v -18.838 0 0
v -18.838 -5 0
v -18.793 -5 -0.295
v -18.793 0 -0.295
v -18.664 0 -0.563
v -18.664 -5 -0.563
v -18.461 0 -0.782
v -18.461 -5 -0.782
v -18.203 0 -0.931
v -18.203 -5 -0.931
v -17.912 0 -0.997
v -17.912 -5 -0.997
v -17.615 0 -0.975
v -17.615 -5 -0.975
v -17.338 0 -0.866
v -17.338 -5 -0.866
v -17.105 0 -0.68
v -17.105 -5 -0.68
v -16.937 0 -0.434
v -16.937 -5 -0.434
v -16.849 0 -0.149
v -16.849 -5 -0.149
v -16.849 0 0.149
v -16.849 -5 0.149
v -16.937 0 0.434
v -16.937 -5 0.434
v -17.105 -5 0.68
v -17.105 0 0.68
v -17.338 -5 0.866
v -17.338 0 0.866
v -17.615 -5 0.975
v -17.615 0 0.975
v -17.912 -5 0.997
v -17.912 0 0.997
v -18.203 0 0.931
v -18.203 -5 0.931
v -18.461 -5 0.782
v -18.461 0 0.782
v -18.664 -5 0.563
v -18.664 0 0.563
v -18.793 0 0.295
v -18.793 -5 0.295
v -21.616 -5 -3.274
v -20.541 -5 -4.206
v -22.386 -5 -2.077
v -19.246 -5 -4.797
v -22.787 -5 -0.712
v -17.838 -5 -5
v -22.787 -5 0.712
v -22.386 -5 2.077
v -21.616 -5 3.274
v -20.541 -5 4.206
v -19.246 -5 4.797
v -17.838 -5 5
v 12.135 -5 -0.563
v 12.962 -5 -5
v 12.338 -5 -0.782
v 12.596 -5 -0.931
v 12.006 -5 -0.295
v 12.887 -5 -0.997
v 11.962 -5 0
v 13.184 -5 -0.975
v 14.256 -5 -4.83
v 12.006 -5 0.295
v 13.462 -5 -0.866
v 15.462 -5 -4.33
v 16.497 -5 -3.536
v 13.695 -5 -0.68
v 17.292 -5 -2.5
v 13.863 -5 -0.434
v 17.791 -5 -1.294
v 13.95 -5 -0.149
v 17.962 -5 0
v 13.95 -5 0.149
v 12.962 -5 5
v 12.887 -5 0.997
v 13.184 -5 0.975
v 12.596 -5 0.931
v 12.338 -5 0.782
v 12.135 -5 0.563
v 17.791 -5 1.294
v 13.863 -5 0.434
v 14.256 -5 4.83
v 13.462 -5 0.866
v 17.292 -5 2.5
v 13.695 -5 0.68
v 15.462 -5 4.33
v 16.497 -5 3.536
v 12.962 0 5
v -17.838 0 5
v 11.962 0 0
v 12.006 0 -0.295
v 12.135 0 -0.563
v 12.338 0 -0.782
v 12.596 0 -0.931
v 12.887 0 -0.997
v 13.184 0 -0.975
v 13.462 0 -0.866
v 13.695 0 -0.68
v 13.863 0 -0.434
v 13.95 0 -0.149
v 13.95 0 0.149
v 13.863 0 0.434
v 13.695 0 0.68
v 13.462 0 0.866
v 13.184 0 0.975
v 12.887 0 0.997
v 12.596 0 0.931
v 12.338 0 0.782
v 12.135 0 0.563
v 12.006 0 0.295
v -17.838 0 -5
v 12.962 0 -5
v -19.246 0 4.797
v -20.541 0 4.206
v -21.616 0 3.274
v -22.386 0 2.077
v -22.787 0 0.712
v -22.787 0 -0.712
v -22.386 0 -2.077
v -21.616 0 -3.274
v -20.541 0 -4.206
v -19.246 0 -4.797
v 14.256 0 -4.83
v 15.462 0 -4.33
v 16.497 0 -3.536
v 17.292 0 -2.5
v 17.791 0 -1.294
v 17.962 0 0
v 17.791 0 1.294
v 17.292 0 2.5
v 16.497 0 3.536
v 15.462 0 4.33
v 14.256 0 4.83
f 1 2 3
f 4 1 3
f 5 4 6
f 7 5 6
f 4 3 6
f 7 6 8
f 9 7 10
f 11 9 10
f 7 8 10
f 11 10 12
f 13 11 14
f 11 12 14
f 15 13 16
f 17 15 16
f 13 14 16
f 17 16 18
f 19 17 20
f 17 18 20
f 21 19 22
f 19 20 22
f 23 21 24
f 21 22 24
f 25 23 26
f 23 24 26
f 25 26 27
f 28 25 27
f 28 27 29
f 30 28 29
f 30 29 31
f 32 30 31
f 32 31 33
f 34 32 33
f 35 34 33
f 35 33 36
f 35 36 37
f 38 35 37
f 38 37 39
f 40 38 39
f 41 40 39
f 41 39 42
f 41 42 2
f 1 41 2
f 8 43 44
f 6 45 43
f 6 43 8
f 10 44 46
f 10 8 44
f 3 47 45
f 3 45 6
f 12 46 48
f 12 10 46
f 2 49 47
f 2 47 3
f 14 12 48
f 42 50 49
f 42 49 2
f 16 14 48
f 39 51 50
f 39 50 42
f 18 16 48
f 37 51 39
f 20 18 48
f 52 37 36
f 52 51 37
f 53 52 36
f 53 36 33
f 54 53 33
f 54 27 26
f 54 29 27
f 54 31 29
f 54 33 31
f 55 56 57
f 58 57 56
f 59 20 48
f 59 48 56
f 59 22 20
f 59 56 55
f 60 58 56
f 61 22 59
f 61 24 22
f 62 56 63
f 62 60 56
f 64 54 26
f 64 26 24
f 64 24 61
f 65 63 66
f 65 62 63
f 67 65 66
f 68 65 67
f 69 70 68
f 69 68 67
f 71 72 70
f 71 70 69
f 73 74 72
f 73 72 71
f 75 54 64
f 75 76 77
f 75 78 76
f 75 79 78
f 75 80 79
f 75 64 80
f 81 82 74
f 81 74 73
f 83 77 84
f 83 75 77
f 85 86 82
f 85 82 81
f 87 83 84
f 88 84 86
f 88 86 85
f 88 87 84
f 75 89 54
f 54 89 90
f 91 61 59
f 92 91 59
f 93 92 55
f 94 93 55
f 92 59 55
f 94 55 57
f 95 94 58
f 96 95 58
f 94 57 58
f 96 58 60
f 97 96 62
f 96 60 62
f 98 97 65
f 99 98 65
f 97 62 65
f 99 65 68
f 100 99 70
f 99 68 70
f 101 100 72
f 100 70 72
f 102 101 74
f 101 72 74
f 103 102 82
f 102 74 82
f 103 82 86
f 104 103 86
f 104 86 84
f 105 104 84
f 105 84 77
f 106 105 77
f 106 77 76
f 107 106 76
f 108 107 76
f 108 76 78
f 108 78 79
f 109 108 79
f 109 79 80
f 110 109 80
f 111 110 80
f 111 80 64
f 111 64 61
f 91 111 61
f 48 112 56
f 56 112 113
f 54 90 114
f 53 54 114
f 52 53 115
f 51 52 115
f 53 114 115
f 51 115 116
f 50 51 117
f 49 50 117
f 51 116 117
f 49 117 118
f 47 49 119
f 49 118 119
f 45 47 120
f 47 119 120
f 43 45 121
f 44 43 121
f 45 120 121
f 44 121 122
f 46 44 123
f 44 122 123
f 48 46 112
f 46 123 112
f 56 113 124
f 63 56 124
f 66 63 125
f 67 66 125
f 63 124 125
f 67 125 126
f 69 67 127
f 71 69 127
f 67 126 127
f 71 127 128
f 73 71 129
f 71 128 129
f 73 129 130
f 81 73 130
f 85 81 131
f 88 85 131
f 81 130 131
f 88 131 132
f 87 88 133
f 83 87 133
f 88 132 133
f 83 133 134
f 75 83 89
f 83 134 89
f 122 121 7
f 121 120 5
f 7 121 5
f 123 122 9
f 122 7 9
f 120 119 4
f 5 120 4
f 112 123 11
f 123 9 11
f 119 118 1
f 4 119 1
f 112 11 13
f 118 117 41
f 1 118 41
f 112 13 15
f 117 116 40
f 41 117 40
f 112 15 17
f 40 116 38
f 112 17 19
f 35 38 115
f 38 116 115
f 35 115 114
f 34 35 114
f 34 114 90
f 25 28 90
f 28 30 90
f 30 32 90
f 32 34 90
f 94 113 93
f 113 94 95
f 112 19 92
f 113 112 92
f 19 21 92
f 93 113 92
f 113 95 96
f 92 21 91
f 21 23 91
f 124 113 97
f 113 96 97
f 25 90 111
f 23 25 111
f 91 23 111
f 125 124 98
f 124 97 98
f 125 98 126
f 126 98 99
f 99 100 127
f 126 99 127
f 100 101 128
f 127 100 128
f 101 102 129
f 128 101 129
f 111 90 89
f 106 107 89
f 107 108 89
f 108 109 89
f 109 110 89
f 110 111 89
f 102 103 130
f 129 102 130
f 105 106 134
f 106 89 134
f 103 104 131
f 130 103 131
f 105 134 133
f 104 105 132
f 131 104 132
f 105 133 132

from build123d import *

# Parameters (mm, degrees)
F3_DEPTH = 5
F4_D     = 2
F5_D     = 2


# Not quite as in the source:
# - a feature names something its author has since deleted; it is built from what else it names


with BuildPart() as f3:
    # F2 (on Front) → F3 (new body)
    with BuildSketch(Plane.XZ):
        with BuildLine():
            ThreePointArc((12.9616053321, -5), (16.4971392381, -3.5355339059), (17.9616053321, 0))
            ThreePointArc((17.9616053321, 0), (16.4971392381, 3.5355339059), (12.9616053321, 5))
            ThreePointArc((12.9616053321, 5), (7.9616053321, 0), (12.9616053321, -5))
        make_face()
        with BuildLine():
            ThreePointArc((12.9616053321, -5), (7.9616053321, 0), (12.9616053321, 5))
            Line((12.9616053321, 5), (-17.8376678377, 5))
            ThreePointArc((-17.8376678377, 5), (-14.3021339318, 3.5355339059), (-12.8376678377, 0))
            ThreePointArc((-12.8376678377, 0), (-14.3021339318, -3.5355339059), (-17.8376678377, -5))
            Line((-17.8376678377, -5), (12.9616053321, -5))
        make_face()
        with BuildLine():
            ThreePointArc((-12.8376678377, 0), (-14.3021339318, 3.5355339059), (-17.8376678377, 5))
            ThreePointArc((-17.8376678377, 5), (-22.8376678377, 0), (-17.8376678377, -5))
            ThreePointArc((-17.8376678377, -5), (-14.3021339318, -3.5355339059), (-12.8376678377, 0))
        make_face()
    extrude(amount=F3_DEPTH)

    # F4 (through all)
    with Locations(Plane(origin=(0, 0, 0), x_dir=(1, 0, 0), z_dir=(0, 1, 0))):
        with Locations((12.9616053321, 0)):
            Hole(F4_D / 2)

    # F5 (through all)
    with Locations(Plane(origin=(0, 0, 0), x_dir=(1, 0, 0), z_dir=(0, 1, 0))):
        with Locations((-17.8376678377, 0)):
            Hole(F5_D / 2)


solid = f3.part
